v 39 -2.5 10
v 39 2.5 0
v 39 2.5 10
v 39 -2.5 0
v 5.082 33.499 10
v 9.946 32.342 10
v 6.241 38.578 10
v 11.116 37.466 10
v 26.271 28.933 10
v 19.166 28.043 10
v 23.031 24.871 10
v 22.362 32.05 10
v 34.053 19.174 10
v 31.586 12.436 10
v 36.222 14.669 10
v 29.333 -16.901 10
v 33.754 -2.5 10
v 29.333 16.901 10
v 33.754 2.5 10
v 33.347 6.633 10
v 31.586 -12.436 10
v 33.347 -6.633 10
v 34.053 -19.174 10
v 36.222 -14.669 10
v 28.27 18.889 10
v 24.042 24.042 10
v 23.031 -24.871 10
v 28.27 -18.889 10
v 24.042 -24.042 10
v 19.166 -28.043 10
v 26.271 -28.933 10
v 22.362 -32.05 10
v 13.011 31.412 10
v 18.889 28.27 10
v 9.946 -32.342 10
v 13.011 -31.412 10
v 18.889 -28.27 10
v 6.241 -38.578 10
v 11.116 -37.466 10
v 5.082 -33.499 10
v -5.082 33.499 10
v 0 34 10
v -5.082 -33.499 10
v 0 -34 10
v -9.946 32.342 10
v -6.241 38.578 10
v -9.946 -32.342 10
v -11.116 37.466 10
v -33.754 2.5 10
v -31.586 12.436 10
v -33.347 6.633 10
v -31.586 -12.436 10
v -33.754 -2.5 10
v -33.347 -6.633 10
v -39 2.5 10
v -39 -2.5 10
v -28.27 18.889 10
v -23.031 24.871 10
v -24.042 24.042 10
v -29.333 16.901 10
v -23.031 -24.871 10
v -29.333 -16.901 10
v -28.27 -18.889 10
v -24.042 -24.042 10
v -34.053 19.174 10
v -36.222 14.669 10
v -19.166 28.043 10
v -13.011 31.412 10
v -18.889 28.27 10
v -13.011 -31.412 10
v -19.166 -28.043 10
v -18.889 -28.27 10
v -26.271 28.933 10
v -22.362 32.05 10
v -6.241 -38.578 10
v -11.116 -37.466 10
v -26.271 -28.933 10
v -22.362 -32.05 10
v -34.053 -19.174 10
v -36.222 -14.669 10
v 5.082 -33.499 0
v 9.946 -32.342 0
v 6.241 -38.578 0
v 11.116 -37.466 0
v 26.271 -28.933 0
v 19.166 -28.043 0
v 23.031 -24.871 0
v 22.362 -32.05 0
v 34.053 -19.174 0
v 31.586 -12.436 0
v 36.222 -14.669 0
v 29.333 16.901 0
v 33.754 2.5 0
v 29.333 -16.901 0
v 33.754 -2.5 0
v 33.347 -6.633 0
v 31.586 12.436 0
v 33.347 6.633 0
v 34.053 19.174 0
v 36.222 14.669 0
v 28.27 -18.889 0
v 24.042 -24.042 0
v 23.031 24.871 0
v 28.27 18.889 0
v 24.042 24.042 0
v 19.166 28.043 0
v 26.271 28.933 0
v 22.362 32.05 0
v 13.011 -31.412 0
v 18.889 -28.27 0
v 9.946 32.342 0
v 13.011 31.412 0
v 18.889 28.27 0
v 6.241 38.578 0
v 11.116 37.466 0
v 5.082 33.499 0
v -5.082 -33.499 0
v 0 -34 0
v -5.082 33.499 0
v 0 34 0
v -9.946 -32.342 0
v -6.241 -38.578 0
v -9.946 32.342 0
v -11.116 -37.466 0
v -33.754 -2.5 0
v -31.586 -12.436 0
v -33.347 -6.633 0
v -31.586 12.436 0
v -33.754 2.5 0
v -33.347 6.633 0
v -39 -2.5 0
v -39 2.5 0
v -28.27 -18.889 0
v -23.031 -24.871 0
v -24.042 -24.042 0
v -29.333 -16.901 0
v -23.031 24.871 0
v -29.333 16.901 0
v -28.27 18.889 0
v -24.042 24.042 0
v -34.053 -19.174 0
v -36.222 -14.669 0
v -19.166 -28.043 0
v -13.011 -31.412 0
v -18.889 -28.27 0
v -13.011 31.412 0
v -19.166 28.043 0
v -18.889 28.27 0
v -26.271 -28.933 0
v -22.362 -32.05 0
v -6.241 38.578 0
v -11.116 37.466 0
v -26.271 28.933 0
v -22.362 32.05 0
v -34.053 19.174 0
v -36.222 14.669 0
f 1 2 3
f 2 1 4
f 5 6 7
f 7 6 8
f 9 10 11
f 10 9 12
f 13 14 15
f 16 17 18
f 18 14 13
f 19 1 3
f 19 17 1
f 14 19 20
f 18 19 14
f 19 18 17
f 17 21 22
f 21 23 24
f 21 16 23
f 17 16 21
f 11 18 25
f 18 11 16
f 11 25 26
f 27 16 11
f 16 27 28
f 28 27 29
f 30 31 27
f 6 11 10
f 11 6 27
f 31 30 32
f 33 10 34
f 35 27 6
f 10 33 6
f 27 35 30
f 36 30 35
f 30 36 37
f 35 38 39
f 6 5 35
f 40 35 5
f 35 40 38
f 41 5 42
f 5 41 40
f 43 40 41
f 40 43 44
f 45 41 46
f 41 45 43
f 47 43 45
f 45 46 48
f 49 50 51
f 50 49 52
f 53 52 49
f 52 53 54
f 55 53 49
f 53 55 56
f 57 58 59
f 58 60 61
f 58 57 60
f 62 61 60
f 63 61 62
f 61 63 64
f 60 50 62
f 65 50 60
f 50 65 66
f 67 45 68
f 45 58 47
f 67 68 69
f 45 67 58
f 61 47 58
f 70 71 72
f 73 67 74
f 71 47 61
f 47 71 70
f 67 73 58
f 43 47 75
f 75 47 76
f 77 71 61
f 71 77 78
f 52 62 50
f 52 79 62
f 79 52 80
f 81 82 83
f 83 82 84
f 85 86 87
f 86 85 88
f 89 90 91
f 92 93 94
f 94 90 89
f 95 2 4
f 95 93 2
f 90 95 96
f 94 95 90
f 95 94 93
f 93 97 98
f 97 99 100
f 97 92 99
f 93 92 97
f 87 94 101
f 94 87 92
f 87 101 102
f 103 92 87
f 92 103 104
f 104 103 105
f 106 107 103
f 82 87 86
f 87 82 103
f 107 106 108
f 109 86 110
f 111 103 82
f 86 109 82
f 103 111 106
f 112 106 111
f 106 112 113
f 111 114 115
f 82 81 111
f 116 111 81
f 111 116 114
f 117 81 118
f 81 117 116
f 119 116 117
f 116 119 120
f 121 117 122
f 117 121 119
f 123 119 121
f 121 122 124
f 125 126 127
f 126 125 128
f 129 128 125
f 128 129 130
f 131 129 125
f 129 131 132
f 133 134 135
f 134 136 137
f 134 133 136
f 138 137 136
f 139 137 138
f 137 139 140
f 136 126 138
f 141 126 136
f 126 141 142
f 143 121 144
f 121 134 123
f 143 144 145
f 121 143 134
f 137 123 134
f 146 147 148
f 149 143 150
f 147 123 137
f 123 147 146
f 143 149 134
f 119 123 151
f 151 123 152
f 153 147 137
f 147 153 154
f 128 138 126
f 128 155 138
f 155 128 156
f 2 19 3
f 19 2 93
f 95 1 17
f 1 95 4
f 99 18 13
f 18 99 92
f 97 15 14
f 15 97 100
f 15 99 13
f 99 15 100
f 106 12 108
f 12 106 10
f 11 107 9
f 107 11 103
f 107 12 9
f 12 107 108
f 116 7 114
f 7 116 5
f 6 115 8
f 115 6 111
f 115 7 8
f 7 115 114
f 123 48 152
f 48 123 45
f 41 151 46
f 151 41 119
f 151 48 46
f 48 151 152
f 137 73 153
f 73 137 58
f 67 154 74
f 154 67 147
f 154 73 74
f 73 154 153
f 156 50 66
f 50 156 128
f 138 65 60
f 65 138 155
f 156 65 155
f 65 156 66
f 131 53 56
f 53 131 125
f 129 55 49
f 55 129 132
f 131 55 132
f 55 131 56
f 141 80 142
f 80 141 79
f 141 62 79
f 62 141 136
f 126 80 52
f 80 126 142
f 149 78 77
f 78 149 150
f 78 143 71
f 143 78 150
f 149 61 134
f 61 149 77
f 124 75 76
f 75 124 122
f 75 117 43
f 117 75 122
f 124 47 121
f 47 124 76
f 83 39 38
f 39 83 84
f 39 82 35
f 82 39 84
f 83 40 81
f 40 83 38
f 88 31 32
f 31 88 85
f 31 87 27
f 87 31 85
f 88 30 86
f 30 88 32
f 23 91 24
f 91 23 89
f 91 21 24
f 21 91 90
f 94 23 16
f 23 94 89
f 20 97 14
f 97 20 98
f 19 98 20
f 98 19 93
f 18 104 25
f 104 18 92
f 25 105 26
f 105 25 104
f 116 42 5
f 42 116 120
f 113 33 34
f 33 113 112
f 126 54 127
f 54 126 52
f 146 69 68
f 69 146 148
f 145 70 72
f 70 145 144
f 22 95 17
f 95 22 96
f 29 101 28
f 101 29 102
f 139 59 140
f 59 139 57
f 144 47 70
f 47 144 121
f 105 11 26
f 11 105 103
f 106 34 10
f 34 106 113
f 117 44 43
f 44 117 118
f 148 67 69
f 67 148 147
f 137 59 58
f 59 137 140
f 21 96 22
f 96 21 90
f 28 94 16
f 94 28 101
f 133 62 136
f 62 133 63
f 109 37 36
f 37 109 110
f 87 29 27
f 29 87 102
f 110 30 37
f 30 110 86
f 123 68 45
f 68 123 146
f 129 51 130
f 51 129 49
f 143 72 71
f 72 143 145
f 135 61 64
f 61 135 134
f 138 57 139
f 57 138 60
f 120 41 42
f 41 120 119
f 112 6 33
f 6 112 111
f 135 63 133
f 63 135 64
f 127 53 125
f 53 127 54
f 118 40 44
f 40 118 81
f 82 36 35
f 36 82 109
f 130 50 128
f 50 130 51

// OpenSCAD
$fn = 32;

// ----------------------------------------------------------------------
// Spur blank: plain gear blank
// ----------------------------------------------------------------------

// --- parameters (mm) ---
disc_r = 34;              // blank root radius
disc_t = 10;              // blank thickness
n_teeth = 14;             // stub tooth count
tooth_w = 5;              // tooth width at the root
tooth_h = 5;              // tooth height above the root
fit_tol = 0.1;            // tolerance for press fits, mm
free_tol = 0.3;           // tolerance for clearance fits, mm

out_r = disc_r + tooth_h;  // tip radius
bbox_x = 78.0;  // measured width over the teeth
bbox_y = 77.16;  // measured depth over the teeth

union() {
  cylinder(r = disc_r, h = disc_t);
  for (i = [0 : n_teeth - 1])
    rotate([0, 0, i * 360 / n_teeth])
      translate([disc_r - 1, -tooth_w / 2, 0])
        cube([tooth_h + 1, tooth_w, disc_t]);
}
